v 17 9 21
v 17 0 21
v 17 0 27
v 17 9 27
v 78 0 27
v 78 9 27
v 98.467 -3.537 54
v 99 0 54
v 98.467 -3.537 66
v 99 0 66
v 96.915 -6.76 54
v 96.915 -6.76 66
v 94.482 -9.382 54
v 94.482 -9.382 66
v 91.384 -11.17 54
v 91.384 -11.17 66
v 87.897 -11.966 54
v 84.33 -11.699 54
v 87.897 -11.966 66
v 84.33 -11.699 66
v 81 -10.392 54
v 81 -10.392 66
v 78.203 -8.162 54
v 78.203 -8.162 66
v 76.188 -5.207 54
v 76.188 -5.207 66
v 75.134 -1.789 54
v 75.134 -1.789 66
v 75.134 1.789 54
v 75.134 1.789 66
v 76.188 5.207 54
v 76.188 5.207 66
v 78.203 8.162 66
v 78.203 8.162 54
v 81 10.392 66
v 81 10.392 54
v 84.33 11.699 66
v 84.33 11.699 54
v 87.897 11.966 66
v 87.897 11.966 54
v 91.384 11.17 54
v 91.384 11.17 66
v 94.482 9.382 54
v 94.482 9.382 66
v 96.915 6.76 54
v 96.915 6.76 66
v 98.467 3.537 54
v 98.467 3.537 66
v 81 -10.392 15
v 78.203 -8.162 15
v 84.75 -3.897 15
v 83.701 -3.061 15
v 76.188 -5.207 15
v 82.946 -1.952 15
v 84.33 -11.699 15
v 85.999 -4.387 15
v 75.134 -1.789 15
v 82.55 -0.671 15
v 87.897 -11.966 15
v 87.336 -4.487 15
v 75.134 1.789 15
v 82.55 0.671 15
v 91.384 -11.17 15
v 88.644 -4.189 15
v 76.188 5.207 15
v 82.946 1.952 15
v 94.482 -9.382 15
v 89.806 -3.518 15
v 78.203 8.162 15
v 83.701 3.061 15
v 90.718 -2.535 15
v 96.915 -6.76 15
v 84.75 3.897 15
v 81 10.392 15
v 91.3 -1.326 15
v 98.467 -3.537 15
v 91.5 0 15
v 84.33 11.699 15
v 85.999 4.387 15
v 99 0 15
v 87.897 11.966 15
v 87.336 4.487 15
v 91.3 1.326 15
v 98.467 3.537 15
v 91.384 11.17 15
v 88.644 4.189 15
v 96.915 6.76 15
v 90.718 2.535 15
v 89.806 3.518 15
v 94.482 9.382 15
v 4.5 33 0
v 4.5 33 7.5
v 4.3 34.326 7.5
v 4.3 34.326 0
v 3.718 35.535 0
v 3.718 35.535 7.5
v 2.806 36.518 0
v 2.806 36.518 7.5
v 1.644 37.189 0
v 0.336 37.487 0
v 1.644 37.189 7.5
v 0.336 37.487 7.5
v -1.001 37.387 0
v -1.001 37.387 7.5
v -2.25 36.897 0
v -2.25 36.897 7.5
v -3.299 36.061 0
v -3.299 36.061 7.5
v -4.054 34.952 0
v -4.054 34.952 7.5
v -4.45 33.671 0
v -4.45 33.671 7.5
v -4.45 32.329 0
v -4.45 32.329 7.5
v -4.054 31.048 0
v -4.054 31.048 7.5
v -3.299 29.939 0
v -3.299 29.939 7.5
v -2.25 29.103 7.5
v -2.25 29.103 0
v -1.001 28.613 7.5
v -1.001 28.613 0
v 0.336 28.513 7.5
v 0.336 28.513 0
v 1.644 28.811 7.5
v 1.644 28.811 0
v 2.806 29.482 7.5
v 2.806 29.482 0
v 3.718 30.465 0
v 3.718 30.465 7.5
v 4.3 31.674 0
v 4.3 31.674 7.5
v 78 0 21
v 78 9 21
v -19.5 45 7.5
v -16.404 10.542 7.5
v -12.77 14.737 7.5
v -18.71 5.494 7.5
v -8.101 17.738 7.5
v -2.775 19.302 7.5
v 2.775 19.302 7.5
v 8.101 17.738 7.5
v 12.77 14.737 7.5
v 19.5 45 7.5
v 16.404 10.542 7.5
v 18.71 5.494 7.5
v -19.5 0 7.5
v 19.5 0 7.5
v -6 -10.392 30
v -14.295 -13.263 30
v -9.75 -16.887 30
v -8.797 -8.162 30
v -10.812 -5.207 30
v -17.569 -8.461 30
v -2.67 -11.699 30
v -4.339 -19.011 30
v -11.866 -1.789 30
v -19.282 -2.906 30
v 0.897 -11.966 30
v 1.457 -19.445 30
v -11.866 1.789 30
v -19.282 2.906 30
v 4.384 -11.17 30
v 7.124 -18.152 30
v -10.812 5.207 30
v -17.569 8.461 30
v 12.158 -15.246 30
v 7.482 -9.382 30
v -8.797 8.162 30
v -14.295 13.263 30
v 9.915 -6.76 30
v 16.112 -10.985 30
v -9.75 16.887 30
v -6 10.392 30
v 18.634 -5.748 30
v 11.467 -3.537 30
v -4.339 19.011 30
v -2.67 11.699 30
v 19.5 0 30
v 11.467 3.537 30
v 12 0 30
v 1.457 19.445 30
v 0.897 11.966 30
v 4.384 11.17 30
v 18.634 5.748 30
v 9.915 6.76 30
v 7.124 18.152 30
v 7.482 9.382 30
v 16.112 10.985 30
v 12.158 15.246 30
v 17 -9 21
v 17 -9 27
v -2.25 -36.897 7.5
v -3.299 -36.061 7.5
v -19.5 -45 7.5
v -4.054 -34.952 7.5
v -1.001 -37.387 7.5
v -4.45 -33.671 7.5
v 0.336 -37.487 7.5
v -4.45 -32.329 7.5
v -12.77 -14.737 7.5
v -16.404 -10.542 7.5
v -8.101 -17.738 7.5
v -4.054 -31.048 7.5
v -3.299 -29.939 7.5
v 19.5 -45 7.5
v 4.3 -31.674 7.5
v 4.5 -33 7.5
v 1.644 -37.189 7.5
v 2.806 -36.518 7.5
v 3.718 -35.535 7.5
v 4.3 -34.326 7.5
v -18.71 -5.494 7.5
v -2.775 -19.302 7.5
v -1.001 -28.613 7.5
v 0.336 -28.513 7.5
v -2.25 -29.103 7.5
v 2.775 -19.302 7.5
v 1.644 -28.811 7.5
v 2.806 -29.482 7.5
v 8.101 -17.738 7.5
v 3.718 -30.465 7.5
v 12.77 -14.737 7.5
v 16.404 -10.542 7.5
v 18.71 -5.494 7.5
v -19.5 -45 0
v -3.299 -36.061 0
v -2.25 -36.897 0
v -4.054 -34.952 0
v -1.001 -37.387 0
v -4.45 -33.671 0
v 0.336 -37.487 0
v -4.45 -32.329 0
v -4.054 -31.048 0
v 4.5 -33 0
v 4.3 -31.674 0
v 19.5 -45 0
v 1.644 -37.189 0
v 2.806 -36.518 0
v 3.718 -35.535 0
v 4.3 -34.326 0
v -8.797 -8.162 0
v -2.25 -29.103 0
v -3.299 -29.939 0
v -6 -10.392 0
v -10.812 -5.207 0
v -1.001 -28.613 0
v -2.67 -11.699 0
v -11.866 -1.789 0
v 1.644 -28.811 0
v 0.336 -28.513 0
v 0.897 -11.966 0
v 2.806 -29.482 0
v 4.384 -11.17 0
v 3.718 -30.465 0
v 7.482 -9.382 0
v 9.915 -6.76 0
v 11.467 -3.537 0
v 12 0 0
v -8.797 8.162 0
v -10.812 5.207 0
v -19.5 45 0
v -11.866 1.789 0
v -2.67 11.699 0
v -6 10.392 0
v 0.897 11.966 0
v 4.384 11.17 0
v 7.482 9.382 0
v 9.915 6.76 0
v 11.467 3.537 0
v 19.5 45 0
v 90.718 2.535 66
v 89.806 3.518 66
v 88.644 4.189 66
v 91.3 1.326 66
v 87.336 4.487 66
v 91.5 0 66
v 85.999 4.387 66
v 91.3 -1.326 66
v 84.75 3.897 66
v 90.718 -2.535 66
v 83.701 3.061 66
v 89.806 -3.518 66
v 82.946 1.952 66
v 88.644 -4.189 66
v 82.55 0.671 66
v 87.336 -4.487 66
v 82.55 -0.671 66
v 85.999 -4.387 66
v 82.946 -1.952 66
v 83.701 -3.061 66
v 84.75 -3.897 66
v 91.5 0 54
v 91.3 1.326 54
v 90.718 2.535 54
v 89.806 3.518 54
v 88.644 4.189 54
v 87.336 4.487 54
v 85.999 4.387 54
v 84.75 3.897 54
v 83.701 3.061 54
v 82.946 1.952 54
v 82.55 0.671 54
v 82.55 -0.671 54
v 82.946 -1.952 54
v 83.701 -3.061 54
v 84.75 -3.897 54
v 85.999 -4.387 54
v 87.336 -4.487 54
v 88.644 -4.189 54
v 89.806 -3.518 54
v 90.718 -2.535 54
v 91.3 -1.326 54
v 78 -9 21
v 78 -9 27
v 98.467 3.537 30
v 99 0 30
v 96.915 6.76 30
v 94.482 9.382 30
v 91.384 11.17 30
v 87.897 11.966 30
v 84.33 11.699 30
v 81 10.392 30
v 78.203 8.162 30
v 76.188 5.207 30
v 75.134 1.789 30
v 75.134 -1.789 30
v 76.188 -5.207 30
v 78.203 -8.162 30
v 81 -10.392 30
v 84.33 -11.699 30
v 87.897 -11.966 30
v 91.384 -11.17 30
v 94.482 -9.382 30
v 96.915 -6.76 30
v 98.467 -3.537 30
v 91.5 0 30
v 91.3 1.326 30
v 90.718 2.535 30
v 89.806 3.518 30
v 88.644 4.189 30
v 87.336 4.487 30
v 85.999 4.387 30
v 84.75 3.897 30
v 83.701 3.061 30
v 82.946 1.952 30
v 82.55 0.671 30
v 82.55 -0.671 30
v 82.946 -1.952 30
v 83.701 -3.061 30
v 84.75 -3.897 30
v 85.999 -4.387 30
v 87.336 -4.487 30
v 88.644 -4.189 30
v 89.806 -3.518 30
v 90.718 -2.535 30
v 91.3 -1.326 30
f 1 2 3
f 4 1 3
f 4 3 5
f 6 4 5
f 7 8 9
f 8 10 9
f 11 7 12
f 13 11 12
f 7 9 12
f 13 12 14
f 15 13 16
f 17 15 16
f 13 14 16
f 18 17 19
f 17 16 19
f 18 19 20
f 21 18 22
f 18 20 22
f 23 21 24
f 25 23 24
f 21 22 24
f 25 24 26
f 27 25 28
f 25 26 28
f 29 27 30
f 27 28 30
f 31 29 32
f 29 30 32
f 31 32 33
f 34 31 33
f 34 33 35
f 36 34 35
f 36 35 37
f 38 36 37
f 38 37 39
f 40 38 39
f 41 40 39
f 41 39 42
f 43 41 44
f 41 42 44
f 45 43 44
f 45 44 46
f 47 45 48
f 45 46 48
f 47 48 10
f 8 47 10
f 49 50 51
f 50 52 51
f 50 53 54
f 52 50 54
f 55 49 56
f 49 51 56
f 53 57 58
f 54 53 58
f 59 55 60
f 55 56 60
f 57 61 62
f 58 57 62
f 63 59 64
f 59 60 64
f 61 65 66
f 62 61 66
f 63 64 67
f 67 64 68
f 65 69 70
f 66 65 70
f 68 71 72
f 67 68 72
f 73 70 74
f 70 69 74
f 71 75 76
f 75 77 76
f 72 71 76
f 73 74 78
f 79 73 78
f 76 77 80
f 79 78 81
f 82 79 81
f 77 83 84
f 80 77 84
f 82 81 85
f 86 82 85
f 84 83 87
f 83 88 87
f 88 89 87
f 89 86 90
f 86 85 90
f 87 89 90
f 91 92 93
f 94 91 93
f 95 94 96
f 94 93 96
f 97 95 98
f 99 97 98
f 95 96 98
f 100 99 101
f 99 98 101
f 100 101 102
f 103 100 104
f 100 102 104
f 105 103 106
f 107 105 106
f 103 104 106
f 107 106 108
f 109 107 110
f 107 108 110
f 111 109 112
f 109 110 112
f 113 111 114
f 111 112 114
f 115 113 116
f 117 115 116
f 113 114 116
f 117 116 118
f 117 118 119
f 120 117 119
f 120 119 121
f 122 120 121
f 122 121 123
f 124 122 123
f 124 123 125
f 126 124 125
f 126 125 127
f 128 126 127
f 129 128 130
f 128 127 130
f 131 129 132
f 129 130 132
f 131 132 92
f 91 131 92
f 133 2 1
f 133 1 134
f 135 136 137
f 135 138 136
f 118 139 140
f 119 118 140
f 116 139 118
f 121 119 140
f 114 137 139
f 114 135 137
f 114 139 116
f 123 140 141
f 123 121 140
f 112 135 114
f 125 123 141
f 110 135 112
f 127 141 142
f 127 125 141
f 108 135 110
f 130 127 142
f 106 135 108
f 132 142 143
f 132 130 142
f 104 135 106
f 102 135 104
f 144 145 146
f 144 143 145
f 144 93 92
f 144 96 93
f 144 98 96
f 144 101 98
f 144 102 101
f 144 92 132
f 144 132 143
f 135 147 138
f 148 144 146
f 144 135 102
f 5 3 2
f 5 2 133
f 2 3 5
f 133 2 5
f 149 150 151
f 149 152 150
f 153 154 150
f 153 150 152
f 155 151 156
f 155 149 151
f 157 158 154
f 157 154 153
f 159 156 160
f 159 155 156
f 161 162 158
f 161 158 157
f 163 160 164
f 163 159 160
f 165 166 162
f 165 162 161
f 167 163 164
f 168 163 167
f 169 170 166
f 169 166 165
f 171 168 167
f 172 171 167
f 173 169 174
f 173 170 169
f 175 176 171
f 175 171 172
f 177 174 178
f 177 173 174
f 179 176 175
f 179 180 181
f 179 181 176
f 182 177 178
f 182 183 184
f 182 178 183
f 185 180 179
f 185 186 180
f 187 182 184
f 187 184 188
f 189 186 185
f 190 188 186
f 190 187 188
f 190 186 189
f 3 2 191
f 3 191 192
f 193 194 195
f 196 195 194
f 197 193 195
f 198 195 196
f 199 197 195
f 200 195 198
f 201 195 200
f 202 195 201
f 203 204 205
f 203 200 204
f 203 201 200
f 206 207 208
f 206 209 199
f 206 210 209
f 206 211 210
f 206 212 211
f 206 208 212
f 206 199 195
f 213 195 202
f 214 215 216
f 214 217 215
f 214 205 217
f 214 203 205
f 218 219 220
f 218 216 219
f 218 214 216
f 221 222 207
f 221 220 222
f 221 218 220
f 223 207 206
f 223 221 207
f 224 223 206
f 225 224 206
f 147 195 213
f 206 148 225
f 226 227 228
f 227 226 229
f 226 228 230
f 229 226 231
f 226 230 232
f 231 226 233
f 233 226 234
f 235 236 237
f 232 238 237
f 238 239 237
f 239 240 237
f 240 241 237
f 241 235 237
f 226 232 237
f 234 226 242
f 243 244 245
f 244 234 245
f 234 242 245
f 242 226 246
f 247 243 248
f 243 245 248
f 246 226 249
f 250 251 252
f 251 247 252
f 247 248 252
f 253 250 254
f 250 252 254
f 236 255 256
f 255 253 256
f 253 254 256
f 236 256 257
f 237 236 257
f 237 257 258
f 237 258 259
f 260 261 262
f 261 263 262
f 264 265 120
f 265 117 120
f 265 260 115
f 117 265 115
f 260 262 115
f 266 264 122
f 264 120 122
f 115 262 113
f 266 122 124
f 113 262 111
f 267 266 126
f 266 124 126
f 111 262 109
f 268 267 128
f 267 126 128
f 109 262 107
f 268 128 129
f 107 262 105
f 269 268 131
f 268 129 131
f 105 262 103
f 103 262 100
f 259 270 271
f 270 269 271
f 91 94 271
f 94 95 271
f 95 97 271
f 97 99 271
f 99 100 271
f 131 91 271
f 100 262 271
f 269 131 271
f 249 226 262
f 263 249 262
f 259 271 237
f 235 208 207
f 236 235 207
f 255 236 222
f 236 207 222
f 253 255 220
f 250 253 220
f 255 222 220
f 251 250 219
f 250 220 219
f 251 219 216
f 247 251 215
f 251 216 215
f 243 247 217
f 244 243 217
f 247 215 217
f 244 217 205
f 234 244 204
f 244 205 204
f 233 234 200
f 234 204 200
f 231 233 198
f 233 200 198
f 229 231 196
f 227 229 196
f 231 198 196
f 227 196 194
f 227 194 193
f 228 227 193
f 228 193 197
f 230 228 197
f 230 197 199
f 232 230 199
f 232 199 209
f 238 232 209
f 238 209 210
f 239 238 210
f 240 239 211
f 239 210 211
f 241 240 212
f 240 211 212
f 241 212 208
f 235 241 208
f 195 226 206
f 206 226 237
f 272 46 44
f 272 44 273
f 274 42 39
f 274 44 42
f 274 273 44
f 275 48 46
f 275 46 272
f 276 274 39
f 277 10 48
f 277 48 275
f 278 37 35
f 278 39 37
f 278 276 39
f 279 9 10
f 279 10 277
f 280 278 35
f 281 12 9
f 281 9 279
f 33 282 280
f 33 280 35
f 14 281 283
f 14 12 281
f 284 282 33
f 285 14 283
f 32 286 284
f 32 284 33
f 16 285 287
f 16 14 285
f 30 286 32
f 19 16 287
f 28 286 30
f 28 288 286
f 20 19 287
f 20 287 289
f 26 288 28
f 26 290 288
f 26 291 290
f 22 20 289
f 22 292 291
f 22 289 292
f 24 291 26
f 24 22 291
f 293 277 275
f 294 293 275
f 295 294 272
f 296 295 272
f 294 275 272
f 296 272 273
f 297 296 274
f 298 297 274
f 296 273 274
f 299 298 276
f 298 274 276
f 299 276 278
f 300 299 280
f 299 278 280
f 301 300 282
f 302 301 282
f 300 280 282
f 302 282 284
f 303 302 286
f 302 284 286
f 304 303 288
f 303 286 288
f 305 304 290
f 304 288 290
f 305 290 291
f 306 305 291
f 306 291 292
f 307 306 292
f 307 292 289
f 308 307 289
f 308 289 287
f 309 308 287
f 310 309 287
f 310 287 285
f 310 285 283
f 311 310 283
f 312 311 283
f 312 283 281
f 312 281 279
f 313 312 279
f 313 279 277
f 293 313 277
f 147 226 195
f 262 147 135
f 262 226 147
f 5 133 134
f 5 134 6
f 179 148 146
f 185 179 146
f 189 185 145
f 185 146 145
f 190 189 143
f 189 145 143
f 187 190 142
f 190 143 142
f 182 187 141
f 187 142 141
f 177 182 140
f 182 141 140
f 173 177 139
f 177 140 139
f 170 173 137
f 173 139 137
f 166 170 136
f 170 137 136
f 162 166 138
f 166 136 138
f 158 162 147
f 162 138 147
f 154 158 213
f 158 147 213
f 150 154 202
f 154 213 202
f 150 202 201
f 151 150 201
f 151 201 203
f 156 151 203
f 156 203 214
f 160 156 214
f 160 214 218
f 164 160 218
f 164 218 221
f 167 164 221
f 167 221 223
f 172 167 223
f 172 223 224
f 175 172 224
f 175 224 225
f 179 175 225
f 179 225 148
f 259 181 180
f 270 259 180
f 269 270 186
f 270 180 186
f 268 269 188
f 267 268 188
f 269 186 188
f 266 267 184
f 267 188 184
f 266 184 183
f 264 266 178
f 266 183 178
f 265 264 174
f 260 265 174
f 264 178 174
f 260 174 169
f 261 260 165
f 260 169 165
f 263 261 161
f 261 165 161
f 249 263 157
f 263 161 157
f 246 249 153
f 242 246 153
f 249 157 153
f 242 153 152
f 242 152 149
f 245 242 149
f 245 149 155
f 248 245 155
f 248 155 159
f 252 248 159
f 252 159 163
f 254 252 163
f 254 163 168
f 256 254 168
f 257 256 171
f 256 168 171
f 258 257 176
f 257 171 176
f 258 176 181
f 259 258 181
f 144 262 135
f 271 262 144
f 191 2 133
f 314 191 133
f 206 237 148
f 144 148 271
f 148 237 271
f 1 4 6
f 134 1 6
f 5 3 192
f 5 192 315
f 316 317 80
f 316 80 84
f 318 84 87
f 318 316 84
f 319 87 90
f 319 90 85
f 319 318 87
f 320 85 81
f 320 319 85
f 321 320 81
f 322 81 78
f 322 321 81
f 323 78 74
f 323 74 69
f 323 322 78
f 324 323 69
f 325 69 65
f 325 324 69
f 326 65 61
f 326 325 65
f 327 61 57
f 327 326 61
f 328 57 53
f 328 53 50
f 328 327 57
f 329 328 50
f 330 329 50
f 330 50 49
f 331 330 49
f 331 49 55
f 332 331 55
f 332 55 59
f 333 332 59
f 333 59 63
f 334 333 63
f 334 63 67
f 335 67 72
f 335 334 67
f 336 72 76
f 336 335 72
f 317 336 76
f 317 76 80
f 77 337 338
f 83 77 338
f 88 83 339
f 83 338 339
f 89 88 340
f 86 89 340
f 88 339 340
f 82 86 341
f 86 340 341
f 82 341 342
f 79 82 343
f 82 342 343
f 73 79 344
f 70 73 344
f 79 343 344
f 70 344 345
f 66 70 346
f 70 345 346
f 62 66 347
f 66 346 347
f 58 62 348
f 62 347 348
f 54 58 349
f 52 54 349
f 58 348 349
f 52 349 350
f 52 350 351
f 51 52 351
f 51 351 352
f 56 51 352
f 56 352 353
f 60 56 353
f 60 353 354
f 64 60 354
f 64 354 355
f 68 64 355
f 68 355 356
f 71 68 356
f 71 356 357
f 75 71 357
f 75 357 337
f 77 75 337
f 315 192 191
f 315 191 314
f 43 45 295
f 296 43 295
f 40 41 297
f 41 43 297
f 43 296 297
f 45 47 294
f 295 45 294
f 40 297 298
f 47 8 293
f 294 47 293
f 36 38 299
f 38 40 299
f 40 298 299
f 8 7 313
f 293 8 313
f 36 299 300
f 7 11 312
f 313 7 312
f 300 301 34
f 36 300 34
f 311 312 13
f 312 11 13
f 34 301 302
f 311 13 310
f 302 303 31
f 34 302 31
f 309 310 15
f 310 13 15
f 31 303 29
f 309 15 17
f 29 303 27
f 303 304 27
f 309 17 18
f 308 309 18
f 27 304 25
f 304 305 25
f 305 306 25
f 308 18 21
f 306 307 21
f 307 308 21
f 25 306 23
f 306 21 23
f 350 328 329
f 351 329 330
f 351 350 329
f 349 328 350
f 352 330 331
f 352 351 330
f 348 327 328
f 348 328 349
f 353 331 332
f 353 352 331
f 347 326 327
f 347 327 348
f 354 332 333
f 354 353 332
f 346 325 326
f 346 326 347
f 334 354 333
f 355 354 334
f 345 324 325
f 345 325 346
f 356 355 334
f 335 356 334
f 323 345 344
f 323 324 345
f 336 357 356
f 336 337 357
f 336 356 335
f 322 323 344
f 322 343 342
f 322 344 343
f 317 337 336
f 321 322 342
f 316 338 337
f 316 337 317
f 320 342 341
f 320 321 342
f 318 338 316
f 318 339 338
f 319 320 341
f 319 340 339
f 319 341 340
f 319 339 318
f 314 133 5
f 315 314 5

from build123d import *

# Parameters (mm, degrees)
F0_W      = 39
F0_H      = 90
F1_DEPTH  = 7.5
F3_R      = 4.5
F4_DEPTH  = 7.5
F5_DEPTH  = 22.5
F6_R      = 12
F7_DEPTH  = 30
F8_R      = 12
F9_DEPTH  = 15
F10_W     = 12
F10_H     = 12
F12_R     = 4.5
F13_DEPTH = 51
F14_R     = 4.5
F15_DEPTH = 15
F16_W     = 61
F16_H     = 6
F17_DEPTH = 9


with BuildPart() as f1:
    # F0 (on Top) → F1 (new body)
    with BuildSketch(Plane.XY):
        Rectangle(F0_W, F0_H)
    extrude(amount=F1_DEPTH)

    # F3 (on face) → F4 (cut, through all)
    with BuildSketch(Plane.XY.offset(7.5)):
        with Locations((0, -33)):
            Circle(F3_R)
        with Locations((0, 33)):
            Circle(F3_R)
    extrude(amount=-F4_DEPTH, mode=Mode.SUBTRACT)

    # F2 (on face) → F5 (join)
    with BuildSketch(Plane.XY.offset(7.5)):
        with BuildLine():
            ThreePointArc((-19.5, -2.3e-08), (1.15e-08, -19.5), (19.5, 0))
            ThreePointArc((19.5, 0), (-1.15e-08, 19.5), (-19.5, -2.3e-08))
        make_face()
    extrude(amount=F5_DEPTH)

    # F6 (on face) → F7 (cut, through all)
    with BuildSketch(Plane.XY.offset(30)):
        Circle(F6_R)
    extrude(amount=-F7_DEPTH, mode=Mode.SUBTRACT)

    # F14 (on face) → F15 (cut, through all)
    with BuildSketch(Plane.XY.offset(30)):
        with Locations((87, 0)):
            Circle(F14_R)
    extrude(amount=-F15_DEPTH, mode=Mode.SUBTRACT)


with BuildPart() as f9:
    # F8 (on face) → F9 (new body)
    with BuildSketch(Plane.XY.offset(30)):
        with Locations((87, 0)):
            Circle(F8_R)
    extrude(amount=-F9_DEPTH)


with BuildPart() as f11:
    # F10 (on Front) → F11 (revolve)
    with BuildSketch(Plane.XZ):
        with Locations((93, 60)):
            Rectangle(F10_W, F10_H)
    revolve(axis=Axis((87, 0, 60), (0, 0, -1)))


with BuildPart() as f13_tool:
    # F12 (on face) → F13 (new body, through all)
    with BuildSketch(Plane.XY.offset(66)):
        with Locations((87, 0)):
            Circle(F12_R)
    extrude(amount=-F13_DEPTH)


with BuildPart() as f9_1:
    add(f9.part)

    # F13: cut by f13_tool
    add(f13_tool.part, mode=Mode.SUBTRACT)


with BuildPart() as f11_1:
    add(f11.part)

    # F13: cut by f13_tool
    add(f13_tool.part, mode=Mode.SUBTRACT)


with BuildPart() as f17:
    # F16 (on Front) → F17 (new body)
    with BuildSketch(Plane.XZ):
        with Locations((47.5, 24)):
            Rectangle(F16_W, F16_H)
    extrude(amount=F17_DEPTH)


with BuildPart() as f18_1:
    # F18: instance of F17
    add(f17.part.mirror(Plane.XZ))


solid = Compound([f1.part, f9_1.part, f11_1.part, f17.part, f18_1.part])
